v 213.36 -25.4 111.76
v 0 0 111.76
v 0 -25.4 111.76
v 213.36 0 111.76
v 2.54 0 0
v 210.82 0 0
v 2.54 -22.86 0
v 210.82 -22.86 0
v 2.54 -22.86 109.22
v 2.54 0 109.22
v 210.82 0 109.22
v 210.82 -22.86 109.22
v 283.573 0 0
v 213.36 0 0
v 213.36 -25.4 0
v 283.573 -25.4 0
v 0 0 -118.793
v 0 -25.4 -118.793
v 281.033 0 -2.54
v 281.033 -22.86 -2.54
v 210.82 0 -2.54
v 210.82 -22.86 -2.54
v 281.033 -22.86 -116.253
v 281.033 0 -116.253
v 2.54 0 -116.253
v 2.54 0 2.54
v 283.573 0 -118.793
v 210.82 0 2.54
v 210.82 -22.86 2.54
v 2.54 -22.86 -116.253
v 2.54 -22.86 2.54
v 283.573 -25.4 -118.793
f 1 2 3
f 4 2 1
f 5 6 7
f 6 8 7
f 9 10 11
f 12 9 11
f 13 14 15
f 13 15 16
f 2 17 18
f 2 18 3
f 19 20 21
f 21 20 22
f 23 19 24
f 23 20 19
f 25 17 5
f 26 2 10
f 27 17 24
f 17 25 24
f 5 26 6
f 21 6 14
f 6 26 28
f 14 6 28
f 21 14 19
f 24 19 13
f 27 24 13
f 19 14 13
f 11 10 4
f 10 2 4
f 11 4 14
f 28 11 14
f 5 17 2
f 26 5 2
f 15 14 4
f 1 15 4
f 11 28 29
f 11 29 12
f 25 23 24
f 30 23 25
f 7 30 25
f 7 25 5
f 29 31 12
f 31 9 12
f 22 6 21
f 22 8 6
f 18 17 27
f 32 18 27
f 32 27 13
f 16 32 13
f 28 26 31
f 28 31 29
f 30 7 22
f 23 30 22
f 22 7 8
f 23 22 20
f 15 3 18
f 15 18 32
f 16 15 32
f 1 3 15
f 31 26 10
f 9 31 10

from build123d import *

# Parameters (mm, degrees)
F0_W     = 213.3595049381
F0_H     = 111.76
F1_DEPTH = 25.4
F2_T     = -2.54
F3_W     = 283.5729122162
F3_H     = 118.7930554152
F4_DEPTH = 25.4
F5_T     = -2.54


# Not quite as in the source:
# - a shell that OpenCascade refuses in one call is made with other operations: the cavity is built on its own and cut out


with BuildPart() as f1:
    # F0 (on Front) → F1 (new body)
    with BuildSketch(Plane.XZ):
        with Locations((106.6797524691, 55.88)):
            Rectangle(F0_W, F0_H)
    extrude(amount=F1_DEPTH)

    # F2
    f2_openings = [f1.faces().sort_by_distance(p)[0] for p in [
        (106.679752, 0, 55.88),
    ]]
    offset(amount=F2_T, openings=f2_openings)

    # F3 (on Front) → F4 (join)
    with BuildSketch(Plane.XZ):
        with Locations((141.7864561081, -59.3965277076)):
            Rectangle(F3_W, F3_H)
    extrude(amount=F4_DEPTH)

    # F5: a shell. OpenCascade refuses it in one call, so the cavity is built on its own and cut out:
    # the body offset inwards by the wall thickness, plus a prism from it out through each open face.
    f5_core = offset(f1.part, amount=F5_T, kind=Kind.INTERSECTION, mode=Mode.PRIVATE)
    f5_exits = [f5_core.faces().sort_by_distance(p)[0] for p in [
        (141.209622, -2.54, -58.441458),
    ]]
    add(f5_core, mode=Mode.SUBTRACT)
    extrude(f5_exits, amount=-F5_T, mode=Mode.SUBTRACT)


solid = f1.part
